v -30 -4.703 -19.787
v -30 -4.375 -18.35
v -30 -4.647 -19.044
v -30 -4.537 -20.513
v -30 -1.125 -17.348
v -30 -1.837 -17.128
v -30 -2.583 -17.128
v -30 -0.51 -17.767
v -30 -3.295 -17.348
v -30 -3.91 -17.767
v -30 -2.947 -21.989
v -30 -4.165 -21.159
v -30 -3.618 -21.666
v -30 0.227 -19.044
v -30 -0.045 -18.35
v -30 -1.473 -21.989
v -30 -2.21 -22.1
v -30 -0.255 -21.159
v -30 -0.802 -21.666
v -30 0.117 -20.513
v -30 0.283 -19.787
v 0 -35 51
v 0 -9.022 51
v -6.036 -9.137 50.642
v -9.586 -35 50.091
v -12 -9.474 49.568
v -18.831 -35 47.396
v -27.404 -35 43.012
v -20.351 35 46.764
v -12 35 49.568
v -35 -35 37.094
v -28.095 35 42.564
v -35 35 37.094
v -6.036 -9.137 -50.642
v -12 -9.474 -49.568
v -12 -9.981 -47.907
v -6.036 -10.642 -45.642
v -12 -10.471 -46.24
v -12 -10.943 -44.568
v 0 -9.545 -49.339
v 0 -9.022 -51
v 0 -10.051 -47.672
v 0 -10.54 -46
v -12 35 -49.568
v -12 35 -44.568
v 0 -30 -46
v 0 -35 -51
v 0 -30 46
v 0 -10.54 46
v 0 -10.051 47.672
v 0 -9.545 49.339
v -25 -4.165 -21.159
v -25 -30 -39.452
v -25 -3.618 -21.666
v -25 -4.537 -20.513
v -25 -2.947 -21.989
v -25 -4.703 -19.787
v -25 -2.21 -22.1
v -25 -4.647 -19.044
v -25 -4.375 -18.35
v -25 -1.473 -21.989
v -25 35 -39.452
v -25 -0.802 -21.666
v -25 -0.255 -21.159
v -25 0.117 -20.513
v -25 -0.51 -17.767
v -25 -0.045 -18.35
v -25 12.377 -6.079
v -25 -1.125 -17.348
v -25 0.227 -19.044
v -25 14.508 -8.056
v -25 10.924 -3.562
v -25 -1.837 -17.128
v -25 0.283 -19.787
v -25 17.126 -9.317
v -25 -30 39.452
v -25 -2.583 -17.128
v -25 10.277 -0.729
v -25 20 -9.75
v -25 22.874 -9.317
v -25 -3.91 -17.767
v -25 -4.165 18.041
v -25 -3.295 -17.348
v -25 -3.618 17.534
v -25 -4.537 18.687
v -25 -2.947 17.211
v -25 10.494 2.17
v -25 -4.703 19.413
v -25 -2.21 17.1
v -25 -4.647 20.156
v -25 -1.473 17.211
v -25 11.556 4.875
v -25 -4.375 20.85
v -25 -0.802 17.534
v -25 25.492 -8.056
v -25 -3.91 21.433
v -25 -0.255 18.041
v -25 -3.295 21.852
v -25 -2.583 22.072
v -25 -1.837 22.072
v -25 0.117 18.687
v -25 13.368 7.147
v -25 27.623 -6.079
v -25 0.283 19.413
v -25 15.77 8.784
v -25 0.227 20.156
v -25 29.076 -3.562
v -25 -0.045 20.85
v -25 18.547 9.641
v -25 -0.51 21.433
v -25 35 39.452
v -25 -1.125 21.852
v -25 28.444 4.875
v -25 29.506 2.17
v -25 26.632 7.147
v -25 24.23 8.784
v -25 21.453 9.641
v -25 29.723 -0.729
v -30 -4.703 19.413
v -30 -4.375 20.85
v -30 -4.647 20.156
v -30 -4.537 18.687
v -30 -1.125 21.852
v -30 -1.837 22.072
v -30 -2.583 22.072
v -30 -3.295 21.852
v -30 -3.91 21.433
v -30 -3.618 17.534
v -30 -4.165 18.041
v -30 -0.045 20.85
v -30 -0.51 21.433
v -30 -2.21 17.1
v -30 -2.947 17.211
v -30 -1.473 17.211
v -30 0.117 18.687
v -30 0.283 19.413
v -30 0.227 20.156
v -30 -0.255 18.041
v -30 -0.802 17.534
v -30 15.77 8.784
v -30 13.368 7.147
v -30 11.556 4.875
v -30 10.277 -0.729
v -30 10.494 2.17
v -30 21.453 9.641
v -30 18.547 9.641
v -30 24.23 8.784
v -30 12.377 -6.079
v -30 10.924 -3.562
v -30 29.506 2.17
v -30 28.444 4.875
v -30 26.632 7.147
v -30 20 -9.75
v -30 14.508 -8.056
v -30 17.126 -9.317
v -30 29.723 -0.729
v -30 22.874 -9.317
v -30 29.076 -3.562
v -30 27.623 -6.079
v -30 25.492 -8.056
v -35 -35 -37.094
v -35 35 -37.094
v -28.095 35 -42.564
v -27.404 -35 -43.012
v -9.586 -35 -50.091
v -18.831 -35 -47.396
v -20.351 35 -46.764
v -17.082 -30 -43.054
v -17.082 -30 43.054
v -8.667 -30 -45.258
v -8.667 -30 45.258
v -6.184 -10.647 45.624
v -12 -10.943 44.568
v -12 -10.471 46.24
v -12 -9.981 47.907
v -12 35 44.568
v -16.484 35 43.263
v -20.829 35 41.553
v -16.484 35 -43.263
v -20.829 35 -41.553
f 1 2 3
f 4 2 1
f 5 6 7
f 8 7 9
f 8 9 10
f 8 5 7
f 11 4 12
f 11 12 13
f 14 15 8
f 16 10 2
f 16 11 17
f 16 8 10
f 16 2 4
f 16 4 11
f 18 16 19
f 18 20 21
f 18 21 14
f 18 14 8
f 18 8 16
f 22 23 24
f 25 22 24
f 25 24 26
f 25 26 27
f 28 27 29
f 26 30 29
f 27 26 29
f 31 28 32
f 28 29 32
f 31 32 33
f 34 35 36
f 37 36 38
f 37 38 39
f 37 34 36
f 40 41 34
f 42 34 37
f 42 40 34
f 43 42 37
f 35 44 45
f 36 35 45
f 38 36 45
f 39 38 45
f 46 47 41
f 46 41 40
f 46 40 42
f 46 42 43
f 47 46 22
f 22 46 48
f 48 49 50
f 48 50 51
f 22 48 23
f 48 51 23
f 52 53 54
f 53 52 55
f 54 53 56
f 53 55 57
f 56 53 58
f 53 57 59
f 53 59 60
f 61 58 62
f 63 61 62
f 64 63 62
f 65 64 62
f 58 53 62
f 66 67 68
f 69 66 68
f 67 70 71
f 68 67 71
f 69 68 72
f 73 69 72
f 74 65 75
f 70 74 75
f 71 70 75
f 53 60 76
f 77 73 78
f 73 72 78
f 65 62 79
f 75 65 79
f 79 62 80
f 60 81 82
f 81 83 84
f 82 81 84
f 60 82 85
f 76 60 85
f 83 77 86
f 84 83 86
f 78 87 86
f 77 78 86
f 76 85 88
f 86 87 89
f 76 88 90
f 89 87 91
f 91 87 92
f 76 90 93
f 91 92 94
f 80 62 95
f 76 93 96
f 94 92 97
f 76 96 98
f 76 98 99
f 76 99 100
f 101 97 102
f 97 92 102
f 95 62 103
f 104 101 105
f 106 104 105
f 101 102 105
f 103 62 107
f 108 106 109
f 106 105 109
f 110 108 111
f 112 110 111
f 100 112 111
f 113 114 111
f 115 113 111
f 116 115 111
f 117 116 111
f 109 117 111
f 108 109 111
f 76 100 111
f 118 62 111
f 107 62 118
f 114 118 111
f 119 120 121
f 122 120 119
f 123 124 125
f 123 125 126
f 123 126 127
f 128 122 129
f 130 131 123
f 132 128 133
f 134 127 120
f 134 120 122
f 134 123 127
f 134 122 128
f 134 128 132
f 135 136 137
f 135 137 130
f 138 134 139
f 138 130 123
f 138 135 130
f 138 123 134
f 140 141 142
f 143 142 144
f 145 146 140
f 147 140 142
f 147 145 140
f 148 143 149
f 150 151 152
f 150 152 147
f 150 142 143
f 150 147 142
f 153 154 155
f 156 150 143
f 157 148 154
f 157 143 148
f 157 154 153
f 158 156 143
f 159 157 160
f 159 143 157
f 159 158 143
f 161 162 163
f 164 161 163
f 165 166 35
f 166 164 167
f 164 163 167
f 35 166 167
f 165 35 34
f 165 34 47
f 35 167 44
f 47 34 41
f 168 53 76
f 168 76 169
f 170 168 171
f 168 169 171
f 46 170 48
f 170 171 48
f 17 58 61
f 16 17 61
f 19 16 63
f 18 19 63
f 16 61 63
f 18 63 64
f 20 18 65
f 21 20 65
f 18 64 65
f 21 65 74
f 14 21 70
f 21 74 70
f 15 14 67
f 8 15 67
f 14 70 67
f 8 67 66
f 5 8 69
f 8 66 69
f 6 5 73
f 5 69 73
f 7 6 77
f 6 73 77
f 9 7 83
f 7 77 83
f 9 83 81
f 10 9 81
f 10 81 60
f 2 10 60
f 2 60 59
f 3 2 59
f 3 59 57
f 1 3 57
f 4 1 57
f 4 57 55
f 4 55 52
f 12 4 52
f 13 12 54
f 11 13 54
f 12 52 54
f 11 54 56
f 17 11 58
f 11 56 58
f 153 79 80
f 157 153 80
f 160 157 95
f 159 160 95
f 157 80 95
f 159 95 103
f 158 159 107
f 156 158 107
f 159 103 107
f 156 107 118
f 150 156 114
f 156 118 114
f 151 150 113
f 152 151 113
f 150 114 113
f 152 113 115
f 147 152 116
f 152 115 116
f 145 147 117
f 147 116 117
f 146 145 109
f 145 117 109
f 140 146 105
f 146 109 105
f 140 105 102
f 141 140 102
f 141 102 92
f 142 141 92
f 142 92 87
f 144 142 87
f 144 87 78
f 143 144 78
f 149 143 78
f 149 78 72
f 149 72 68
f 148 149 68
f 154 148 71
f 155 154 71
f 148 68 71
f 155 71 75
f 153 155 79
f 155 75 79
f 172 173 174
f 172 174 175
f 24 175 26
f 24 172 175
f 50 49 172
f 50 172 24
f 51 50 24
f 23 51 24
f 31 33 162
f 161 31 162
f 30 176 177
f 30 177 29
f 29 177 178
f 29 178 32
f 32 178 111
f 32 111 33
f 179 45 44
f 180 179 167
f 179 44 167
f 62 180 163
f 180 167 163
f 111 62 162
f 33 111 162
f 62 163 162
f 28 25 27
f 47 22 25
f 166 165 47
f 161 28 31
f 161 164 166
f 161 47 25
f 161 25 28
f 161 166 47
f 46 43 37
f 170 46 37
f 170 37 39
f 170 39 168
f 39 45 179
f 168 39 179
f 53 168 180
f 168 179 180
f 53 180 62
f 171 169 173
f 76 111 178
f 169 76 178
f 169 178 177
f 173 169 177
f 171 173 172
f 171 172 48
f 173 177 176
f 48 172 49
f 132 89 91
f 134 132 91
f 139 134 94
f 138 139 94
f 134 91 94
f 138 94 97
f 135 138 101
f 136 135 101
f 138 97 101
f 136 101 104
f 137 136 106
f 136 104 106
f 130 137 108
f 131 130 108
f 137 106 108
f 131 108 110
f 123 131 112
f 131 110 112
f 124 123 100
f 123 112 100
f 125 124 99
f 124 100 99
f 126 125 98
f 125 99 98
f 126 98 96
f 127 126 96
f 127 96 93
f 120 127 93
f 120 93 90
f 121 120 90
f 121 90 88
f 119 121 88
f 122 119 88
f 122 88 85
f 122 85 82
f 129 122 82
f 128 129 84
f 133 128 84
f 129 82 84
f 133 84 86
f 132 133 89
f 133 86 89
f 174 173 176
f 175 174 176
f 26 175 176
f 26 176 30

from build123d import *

# Parameters (mm, degrees)
BOSS_EXTRU_7_DEPTH      = 35
BOSS_EXTRU_8_START      = -5
BOSS_EXTRU_8_DEPTH      = 5
ESQUISSE3_R             = 2.4999999999999987
ENL_V_MAT_EXTRU_1_DEPTH = 5
ENL_V_MAT_EXTRU_2_DEPTH = 12
ESQUISSE6_R             = 9.75
ENL_V_MAT_EXTRU_3_DEPTH = 5


with BuildPart() as part:
    # Esquisse1 → Boss.-Extru.7 (new, symmetric)
    with BuildSketch(Plane(origin=(0, 0, 0), x_dir=(1, 0, 0), z_dir=(0, 1, 0))):
        with BuildLine():
            Line((0, 51.00000000000001), (1.188e-14, 46.00000000000001))
            ThreePointArc((1.188e-14, 46.00000000000001), (-12.921623376513631, 44.33590628857987), (-24.99999999999999, 39.45222154178573))
            Line((-24.99999999999999, 39.45222154178573), (-24.99999999999999, -39.45222154178573))
            ThreePointArc((-24.99999999999999, -39.45222154178573), (-12.921623376513633, -44.33590628857988), (1.188e-14, -46.00000000000001))
            Line((1.188e-14, -46.00000000000001), (0, -51.00000000000001))
            ThreePointArc((0, -51.00000000000001), (-18.830584522511188, -47.39629823668259), (-35, -37.09447398198281))
            Line((-35, -37.09447398198281), (-35, 37.09447398198281))
            ThreePointArc((-35, 37.09447398198281), (-18.830584522511195, 47.396298236682604), (0, 51.00000000000001))
        make_face()
    extrude(amount=BOSS_EXTRU_7_DEPTH, both=True)

    # Esquisse2 → Boss.-Extru.8 (add)
    with BuildSketch(Plane.XZ.offset(35).offset(BOSS_EXTRU_8_START)):
        with BuildLine():
            Line((-34.99999999999999, 37.094473981982816), (-34.99999999999999, -37.094473981982816))
            ThreePointArc((-34.99999999999999, -37.094473981982816), (-18.830584522511195, -47.396298236682604), (0, -51.00000000000001))
            Line((0, -51.00000000000001), (0, 51.00000000000001))
            ThreePointArc((0, 51.00000000000001), (-18.830584522511195, 47.396298236682604), (-34.99999999999999, 37.094473981982816))
        make_face()
    extrude(amount=BOSS_EXTRU_8_DEPTH)

    # Esquisse3 → Enlèv. mat.-Extru.1 (cut)
    with BuildSketch(Plane(origin=(-24.99999999999999, 0, 0), x_dir=(0, 0, -1), z_dir=(1, 0, 0))):
        with Locations((-19.600000000000012, -2.2100000000000035)):
            Circle(ESQUISSE3_R)
        with Locations((19.59999999999999, -2.209999999999999)):
            Circle(ESQUISSE3_R)
    extrude(amount=-ENL_V_MAT_EXTRU_1_DEPTH, mode=Mode.SUBTRACT)

    # Esquisse5 → Enlèv. mat.-Extru.2 (cut)
    with BuildSketch(Plane(origin=(0, 0, 0), x_dir=(2.38e-15, 0, -1), z_dir=(1, 0, 2.38e-15))):
        with BuildLine():
            Line((40.674477228026994, 51.032394682771525), (98.05120693404734, 14.815086571109495))
            ThreePointArc((98.05120693404734, 14.815086571109495), (1.023e-14, -17), (-98.05120693404734, 14.81508657110947))
            Line((-98.05120693404734, 14.81508657110947), (-40.674477228026994, 51.03239468277152))
            ThreePointArc((-40.674477228026994, 51.03239468277152), (6.55e-15, 43.000000000000014), (40.674477228026994, 51.032394682771525))
        make_face()
    extrude(amount=-ENL_V_MAT_EXTRU_2_DEPTH, mode=Mode.SUBTRACT)

    # Esquisse6 → Enlèv. mat.-Extru.3 (cut)
    with BuildSketch(Plane(origin=(-24.99999999999999, 0, 0), x_dir=(0, 0, -1), z_dir=(1, 0, 0))):
        with Locations((0, 20.000000000000004)):
            Circle(ESQUISSE6_R)
    extrude(amount=-ENL_V_MAT_EXTRU_3_DEPTH, mode=Mode.SUBTRACT)


solid = part.part
